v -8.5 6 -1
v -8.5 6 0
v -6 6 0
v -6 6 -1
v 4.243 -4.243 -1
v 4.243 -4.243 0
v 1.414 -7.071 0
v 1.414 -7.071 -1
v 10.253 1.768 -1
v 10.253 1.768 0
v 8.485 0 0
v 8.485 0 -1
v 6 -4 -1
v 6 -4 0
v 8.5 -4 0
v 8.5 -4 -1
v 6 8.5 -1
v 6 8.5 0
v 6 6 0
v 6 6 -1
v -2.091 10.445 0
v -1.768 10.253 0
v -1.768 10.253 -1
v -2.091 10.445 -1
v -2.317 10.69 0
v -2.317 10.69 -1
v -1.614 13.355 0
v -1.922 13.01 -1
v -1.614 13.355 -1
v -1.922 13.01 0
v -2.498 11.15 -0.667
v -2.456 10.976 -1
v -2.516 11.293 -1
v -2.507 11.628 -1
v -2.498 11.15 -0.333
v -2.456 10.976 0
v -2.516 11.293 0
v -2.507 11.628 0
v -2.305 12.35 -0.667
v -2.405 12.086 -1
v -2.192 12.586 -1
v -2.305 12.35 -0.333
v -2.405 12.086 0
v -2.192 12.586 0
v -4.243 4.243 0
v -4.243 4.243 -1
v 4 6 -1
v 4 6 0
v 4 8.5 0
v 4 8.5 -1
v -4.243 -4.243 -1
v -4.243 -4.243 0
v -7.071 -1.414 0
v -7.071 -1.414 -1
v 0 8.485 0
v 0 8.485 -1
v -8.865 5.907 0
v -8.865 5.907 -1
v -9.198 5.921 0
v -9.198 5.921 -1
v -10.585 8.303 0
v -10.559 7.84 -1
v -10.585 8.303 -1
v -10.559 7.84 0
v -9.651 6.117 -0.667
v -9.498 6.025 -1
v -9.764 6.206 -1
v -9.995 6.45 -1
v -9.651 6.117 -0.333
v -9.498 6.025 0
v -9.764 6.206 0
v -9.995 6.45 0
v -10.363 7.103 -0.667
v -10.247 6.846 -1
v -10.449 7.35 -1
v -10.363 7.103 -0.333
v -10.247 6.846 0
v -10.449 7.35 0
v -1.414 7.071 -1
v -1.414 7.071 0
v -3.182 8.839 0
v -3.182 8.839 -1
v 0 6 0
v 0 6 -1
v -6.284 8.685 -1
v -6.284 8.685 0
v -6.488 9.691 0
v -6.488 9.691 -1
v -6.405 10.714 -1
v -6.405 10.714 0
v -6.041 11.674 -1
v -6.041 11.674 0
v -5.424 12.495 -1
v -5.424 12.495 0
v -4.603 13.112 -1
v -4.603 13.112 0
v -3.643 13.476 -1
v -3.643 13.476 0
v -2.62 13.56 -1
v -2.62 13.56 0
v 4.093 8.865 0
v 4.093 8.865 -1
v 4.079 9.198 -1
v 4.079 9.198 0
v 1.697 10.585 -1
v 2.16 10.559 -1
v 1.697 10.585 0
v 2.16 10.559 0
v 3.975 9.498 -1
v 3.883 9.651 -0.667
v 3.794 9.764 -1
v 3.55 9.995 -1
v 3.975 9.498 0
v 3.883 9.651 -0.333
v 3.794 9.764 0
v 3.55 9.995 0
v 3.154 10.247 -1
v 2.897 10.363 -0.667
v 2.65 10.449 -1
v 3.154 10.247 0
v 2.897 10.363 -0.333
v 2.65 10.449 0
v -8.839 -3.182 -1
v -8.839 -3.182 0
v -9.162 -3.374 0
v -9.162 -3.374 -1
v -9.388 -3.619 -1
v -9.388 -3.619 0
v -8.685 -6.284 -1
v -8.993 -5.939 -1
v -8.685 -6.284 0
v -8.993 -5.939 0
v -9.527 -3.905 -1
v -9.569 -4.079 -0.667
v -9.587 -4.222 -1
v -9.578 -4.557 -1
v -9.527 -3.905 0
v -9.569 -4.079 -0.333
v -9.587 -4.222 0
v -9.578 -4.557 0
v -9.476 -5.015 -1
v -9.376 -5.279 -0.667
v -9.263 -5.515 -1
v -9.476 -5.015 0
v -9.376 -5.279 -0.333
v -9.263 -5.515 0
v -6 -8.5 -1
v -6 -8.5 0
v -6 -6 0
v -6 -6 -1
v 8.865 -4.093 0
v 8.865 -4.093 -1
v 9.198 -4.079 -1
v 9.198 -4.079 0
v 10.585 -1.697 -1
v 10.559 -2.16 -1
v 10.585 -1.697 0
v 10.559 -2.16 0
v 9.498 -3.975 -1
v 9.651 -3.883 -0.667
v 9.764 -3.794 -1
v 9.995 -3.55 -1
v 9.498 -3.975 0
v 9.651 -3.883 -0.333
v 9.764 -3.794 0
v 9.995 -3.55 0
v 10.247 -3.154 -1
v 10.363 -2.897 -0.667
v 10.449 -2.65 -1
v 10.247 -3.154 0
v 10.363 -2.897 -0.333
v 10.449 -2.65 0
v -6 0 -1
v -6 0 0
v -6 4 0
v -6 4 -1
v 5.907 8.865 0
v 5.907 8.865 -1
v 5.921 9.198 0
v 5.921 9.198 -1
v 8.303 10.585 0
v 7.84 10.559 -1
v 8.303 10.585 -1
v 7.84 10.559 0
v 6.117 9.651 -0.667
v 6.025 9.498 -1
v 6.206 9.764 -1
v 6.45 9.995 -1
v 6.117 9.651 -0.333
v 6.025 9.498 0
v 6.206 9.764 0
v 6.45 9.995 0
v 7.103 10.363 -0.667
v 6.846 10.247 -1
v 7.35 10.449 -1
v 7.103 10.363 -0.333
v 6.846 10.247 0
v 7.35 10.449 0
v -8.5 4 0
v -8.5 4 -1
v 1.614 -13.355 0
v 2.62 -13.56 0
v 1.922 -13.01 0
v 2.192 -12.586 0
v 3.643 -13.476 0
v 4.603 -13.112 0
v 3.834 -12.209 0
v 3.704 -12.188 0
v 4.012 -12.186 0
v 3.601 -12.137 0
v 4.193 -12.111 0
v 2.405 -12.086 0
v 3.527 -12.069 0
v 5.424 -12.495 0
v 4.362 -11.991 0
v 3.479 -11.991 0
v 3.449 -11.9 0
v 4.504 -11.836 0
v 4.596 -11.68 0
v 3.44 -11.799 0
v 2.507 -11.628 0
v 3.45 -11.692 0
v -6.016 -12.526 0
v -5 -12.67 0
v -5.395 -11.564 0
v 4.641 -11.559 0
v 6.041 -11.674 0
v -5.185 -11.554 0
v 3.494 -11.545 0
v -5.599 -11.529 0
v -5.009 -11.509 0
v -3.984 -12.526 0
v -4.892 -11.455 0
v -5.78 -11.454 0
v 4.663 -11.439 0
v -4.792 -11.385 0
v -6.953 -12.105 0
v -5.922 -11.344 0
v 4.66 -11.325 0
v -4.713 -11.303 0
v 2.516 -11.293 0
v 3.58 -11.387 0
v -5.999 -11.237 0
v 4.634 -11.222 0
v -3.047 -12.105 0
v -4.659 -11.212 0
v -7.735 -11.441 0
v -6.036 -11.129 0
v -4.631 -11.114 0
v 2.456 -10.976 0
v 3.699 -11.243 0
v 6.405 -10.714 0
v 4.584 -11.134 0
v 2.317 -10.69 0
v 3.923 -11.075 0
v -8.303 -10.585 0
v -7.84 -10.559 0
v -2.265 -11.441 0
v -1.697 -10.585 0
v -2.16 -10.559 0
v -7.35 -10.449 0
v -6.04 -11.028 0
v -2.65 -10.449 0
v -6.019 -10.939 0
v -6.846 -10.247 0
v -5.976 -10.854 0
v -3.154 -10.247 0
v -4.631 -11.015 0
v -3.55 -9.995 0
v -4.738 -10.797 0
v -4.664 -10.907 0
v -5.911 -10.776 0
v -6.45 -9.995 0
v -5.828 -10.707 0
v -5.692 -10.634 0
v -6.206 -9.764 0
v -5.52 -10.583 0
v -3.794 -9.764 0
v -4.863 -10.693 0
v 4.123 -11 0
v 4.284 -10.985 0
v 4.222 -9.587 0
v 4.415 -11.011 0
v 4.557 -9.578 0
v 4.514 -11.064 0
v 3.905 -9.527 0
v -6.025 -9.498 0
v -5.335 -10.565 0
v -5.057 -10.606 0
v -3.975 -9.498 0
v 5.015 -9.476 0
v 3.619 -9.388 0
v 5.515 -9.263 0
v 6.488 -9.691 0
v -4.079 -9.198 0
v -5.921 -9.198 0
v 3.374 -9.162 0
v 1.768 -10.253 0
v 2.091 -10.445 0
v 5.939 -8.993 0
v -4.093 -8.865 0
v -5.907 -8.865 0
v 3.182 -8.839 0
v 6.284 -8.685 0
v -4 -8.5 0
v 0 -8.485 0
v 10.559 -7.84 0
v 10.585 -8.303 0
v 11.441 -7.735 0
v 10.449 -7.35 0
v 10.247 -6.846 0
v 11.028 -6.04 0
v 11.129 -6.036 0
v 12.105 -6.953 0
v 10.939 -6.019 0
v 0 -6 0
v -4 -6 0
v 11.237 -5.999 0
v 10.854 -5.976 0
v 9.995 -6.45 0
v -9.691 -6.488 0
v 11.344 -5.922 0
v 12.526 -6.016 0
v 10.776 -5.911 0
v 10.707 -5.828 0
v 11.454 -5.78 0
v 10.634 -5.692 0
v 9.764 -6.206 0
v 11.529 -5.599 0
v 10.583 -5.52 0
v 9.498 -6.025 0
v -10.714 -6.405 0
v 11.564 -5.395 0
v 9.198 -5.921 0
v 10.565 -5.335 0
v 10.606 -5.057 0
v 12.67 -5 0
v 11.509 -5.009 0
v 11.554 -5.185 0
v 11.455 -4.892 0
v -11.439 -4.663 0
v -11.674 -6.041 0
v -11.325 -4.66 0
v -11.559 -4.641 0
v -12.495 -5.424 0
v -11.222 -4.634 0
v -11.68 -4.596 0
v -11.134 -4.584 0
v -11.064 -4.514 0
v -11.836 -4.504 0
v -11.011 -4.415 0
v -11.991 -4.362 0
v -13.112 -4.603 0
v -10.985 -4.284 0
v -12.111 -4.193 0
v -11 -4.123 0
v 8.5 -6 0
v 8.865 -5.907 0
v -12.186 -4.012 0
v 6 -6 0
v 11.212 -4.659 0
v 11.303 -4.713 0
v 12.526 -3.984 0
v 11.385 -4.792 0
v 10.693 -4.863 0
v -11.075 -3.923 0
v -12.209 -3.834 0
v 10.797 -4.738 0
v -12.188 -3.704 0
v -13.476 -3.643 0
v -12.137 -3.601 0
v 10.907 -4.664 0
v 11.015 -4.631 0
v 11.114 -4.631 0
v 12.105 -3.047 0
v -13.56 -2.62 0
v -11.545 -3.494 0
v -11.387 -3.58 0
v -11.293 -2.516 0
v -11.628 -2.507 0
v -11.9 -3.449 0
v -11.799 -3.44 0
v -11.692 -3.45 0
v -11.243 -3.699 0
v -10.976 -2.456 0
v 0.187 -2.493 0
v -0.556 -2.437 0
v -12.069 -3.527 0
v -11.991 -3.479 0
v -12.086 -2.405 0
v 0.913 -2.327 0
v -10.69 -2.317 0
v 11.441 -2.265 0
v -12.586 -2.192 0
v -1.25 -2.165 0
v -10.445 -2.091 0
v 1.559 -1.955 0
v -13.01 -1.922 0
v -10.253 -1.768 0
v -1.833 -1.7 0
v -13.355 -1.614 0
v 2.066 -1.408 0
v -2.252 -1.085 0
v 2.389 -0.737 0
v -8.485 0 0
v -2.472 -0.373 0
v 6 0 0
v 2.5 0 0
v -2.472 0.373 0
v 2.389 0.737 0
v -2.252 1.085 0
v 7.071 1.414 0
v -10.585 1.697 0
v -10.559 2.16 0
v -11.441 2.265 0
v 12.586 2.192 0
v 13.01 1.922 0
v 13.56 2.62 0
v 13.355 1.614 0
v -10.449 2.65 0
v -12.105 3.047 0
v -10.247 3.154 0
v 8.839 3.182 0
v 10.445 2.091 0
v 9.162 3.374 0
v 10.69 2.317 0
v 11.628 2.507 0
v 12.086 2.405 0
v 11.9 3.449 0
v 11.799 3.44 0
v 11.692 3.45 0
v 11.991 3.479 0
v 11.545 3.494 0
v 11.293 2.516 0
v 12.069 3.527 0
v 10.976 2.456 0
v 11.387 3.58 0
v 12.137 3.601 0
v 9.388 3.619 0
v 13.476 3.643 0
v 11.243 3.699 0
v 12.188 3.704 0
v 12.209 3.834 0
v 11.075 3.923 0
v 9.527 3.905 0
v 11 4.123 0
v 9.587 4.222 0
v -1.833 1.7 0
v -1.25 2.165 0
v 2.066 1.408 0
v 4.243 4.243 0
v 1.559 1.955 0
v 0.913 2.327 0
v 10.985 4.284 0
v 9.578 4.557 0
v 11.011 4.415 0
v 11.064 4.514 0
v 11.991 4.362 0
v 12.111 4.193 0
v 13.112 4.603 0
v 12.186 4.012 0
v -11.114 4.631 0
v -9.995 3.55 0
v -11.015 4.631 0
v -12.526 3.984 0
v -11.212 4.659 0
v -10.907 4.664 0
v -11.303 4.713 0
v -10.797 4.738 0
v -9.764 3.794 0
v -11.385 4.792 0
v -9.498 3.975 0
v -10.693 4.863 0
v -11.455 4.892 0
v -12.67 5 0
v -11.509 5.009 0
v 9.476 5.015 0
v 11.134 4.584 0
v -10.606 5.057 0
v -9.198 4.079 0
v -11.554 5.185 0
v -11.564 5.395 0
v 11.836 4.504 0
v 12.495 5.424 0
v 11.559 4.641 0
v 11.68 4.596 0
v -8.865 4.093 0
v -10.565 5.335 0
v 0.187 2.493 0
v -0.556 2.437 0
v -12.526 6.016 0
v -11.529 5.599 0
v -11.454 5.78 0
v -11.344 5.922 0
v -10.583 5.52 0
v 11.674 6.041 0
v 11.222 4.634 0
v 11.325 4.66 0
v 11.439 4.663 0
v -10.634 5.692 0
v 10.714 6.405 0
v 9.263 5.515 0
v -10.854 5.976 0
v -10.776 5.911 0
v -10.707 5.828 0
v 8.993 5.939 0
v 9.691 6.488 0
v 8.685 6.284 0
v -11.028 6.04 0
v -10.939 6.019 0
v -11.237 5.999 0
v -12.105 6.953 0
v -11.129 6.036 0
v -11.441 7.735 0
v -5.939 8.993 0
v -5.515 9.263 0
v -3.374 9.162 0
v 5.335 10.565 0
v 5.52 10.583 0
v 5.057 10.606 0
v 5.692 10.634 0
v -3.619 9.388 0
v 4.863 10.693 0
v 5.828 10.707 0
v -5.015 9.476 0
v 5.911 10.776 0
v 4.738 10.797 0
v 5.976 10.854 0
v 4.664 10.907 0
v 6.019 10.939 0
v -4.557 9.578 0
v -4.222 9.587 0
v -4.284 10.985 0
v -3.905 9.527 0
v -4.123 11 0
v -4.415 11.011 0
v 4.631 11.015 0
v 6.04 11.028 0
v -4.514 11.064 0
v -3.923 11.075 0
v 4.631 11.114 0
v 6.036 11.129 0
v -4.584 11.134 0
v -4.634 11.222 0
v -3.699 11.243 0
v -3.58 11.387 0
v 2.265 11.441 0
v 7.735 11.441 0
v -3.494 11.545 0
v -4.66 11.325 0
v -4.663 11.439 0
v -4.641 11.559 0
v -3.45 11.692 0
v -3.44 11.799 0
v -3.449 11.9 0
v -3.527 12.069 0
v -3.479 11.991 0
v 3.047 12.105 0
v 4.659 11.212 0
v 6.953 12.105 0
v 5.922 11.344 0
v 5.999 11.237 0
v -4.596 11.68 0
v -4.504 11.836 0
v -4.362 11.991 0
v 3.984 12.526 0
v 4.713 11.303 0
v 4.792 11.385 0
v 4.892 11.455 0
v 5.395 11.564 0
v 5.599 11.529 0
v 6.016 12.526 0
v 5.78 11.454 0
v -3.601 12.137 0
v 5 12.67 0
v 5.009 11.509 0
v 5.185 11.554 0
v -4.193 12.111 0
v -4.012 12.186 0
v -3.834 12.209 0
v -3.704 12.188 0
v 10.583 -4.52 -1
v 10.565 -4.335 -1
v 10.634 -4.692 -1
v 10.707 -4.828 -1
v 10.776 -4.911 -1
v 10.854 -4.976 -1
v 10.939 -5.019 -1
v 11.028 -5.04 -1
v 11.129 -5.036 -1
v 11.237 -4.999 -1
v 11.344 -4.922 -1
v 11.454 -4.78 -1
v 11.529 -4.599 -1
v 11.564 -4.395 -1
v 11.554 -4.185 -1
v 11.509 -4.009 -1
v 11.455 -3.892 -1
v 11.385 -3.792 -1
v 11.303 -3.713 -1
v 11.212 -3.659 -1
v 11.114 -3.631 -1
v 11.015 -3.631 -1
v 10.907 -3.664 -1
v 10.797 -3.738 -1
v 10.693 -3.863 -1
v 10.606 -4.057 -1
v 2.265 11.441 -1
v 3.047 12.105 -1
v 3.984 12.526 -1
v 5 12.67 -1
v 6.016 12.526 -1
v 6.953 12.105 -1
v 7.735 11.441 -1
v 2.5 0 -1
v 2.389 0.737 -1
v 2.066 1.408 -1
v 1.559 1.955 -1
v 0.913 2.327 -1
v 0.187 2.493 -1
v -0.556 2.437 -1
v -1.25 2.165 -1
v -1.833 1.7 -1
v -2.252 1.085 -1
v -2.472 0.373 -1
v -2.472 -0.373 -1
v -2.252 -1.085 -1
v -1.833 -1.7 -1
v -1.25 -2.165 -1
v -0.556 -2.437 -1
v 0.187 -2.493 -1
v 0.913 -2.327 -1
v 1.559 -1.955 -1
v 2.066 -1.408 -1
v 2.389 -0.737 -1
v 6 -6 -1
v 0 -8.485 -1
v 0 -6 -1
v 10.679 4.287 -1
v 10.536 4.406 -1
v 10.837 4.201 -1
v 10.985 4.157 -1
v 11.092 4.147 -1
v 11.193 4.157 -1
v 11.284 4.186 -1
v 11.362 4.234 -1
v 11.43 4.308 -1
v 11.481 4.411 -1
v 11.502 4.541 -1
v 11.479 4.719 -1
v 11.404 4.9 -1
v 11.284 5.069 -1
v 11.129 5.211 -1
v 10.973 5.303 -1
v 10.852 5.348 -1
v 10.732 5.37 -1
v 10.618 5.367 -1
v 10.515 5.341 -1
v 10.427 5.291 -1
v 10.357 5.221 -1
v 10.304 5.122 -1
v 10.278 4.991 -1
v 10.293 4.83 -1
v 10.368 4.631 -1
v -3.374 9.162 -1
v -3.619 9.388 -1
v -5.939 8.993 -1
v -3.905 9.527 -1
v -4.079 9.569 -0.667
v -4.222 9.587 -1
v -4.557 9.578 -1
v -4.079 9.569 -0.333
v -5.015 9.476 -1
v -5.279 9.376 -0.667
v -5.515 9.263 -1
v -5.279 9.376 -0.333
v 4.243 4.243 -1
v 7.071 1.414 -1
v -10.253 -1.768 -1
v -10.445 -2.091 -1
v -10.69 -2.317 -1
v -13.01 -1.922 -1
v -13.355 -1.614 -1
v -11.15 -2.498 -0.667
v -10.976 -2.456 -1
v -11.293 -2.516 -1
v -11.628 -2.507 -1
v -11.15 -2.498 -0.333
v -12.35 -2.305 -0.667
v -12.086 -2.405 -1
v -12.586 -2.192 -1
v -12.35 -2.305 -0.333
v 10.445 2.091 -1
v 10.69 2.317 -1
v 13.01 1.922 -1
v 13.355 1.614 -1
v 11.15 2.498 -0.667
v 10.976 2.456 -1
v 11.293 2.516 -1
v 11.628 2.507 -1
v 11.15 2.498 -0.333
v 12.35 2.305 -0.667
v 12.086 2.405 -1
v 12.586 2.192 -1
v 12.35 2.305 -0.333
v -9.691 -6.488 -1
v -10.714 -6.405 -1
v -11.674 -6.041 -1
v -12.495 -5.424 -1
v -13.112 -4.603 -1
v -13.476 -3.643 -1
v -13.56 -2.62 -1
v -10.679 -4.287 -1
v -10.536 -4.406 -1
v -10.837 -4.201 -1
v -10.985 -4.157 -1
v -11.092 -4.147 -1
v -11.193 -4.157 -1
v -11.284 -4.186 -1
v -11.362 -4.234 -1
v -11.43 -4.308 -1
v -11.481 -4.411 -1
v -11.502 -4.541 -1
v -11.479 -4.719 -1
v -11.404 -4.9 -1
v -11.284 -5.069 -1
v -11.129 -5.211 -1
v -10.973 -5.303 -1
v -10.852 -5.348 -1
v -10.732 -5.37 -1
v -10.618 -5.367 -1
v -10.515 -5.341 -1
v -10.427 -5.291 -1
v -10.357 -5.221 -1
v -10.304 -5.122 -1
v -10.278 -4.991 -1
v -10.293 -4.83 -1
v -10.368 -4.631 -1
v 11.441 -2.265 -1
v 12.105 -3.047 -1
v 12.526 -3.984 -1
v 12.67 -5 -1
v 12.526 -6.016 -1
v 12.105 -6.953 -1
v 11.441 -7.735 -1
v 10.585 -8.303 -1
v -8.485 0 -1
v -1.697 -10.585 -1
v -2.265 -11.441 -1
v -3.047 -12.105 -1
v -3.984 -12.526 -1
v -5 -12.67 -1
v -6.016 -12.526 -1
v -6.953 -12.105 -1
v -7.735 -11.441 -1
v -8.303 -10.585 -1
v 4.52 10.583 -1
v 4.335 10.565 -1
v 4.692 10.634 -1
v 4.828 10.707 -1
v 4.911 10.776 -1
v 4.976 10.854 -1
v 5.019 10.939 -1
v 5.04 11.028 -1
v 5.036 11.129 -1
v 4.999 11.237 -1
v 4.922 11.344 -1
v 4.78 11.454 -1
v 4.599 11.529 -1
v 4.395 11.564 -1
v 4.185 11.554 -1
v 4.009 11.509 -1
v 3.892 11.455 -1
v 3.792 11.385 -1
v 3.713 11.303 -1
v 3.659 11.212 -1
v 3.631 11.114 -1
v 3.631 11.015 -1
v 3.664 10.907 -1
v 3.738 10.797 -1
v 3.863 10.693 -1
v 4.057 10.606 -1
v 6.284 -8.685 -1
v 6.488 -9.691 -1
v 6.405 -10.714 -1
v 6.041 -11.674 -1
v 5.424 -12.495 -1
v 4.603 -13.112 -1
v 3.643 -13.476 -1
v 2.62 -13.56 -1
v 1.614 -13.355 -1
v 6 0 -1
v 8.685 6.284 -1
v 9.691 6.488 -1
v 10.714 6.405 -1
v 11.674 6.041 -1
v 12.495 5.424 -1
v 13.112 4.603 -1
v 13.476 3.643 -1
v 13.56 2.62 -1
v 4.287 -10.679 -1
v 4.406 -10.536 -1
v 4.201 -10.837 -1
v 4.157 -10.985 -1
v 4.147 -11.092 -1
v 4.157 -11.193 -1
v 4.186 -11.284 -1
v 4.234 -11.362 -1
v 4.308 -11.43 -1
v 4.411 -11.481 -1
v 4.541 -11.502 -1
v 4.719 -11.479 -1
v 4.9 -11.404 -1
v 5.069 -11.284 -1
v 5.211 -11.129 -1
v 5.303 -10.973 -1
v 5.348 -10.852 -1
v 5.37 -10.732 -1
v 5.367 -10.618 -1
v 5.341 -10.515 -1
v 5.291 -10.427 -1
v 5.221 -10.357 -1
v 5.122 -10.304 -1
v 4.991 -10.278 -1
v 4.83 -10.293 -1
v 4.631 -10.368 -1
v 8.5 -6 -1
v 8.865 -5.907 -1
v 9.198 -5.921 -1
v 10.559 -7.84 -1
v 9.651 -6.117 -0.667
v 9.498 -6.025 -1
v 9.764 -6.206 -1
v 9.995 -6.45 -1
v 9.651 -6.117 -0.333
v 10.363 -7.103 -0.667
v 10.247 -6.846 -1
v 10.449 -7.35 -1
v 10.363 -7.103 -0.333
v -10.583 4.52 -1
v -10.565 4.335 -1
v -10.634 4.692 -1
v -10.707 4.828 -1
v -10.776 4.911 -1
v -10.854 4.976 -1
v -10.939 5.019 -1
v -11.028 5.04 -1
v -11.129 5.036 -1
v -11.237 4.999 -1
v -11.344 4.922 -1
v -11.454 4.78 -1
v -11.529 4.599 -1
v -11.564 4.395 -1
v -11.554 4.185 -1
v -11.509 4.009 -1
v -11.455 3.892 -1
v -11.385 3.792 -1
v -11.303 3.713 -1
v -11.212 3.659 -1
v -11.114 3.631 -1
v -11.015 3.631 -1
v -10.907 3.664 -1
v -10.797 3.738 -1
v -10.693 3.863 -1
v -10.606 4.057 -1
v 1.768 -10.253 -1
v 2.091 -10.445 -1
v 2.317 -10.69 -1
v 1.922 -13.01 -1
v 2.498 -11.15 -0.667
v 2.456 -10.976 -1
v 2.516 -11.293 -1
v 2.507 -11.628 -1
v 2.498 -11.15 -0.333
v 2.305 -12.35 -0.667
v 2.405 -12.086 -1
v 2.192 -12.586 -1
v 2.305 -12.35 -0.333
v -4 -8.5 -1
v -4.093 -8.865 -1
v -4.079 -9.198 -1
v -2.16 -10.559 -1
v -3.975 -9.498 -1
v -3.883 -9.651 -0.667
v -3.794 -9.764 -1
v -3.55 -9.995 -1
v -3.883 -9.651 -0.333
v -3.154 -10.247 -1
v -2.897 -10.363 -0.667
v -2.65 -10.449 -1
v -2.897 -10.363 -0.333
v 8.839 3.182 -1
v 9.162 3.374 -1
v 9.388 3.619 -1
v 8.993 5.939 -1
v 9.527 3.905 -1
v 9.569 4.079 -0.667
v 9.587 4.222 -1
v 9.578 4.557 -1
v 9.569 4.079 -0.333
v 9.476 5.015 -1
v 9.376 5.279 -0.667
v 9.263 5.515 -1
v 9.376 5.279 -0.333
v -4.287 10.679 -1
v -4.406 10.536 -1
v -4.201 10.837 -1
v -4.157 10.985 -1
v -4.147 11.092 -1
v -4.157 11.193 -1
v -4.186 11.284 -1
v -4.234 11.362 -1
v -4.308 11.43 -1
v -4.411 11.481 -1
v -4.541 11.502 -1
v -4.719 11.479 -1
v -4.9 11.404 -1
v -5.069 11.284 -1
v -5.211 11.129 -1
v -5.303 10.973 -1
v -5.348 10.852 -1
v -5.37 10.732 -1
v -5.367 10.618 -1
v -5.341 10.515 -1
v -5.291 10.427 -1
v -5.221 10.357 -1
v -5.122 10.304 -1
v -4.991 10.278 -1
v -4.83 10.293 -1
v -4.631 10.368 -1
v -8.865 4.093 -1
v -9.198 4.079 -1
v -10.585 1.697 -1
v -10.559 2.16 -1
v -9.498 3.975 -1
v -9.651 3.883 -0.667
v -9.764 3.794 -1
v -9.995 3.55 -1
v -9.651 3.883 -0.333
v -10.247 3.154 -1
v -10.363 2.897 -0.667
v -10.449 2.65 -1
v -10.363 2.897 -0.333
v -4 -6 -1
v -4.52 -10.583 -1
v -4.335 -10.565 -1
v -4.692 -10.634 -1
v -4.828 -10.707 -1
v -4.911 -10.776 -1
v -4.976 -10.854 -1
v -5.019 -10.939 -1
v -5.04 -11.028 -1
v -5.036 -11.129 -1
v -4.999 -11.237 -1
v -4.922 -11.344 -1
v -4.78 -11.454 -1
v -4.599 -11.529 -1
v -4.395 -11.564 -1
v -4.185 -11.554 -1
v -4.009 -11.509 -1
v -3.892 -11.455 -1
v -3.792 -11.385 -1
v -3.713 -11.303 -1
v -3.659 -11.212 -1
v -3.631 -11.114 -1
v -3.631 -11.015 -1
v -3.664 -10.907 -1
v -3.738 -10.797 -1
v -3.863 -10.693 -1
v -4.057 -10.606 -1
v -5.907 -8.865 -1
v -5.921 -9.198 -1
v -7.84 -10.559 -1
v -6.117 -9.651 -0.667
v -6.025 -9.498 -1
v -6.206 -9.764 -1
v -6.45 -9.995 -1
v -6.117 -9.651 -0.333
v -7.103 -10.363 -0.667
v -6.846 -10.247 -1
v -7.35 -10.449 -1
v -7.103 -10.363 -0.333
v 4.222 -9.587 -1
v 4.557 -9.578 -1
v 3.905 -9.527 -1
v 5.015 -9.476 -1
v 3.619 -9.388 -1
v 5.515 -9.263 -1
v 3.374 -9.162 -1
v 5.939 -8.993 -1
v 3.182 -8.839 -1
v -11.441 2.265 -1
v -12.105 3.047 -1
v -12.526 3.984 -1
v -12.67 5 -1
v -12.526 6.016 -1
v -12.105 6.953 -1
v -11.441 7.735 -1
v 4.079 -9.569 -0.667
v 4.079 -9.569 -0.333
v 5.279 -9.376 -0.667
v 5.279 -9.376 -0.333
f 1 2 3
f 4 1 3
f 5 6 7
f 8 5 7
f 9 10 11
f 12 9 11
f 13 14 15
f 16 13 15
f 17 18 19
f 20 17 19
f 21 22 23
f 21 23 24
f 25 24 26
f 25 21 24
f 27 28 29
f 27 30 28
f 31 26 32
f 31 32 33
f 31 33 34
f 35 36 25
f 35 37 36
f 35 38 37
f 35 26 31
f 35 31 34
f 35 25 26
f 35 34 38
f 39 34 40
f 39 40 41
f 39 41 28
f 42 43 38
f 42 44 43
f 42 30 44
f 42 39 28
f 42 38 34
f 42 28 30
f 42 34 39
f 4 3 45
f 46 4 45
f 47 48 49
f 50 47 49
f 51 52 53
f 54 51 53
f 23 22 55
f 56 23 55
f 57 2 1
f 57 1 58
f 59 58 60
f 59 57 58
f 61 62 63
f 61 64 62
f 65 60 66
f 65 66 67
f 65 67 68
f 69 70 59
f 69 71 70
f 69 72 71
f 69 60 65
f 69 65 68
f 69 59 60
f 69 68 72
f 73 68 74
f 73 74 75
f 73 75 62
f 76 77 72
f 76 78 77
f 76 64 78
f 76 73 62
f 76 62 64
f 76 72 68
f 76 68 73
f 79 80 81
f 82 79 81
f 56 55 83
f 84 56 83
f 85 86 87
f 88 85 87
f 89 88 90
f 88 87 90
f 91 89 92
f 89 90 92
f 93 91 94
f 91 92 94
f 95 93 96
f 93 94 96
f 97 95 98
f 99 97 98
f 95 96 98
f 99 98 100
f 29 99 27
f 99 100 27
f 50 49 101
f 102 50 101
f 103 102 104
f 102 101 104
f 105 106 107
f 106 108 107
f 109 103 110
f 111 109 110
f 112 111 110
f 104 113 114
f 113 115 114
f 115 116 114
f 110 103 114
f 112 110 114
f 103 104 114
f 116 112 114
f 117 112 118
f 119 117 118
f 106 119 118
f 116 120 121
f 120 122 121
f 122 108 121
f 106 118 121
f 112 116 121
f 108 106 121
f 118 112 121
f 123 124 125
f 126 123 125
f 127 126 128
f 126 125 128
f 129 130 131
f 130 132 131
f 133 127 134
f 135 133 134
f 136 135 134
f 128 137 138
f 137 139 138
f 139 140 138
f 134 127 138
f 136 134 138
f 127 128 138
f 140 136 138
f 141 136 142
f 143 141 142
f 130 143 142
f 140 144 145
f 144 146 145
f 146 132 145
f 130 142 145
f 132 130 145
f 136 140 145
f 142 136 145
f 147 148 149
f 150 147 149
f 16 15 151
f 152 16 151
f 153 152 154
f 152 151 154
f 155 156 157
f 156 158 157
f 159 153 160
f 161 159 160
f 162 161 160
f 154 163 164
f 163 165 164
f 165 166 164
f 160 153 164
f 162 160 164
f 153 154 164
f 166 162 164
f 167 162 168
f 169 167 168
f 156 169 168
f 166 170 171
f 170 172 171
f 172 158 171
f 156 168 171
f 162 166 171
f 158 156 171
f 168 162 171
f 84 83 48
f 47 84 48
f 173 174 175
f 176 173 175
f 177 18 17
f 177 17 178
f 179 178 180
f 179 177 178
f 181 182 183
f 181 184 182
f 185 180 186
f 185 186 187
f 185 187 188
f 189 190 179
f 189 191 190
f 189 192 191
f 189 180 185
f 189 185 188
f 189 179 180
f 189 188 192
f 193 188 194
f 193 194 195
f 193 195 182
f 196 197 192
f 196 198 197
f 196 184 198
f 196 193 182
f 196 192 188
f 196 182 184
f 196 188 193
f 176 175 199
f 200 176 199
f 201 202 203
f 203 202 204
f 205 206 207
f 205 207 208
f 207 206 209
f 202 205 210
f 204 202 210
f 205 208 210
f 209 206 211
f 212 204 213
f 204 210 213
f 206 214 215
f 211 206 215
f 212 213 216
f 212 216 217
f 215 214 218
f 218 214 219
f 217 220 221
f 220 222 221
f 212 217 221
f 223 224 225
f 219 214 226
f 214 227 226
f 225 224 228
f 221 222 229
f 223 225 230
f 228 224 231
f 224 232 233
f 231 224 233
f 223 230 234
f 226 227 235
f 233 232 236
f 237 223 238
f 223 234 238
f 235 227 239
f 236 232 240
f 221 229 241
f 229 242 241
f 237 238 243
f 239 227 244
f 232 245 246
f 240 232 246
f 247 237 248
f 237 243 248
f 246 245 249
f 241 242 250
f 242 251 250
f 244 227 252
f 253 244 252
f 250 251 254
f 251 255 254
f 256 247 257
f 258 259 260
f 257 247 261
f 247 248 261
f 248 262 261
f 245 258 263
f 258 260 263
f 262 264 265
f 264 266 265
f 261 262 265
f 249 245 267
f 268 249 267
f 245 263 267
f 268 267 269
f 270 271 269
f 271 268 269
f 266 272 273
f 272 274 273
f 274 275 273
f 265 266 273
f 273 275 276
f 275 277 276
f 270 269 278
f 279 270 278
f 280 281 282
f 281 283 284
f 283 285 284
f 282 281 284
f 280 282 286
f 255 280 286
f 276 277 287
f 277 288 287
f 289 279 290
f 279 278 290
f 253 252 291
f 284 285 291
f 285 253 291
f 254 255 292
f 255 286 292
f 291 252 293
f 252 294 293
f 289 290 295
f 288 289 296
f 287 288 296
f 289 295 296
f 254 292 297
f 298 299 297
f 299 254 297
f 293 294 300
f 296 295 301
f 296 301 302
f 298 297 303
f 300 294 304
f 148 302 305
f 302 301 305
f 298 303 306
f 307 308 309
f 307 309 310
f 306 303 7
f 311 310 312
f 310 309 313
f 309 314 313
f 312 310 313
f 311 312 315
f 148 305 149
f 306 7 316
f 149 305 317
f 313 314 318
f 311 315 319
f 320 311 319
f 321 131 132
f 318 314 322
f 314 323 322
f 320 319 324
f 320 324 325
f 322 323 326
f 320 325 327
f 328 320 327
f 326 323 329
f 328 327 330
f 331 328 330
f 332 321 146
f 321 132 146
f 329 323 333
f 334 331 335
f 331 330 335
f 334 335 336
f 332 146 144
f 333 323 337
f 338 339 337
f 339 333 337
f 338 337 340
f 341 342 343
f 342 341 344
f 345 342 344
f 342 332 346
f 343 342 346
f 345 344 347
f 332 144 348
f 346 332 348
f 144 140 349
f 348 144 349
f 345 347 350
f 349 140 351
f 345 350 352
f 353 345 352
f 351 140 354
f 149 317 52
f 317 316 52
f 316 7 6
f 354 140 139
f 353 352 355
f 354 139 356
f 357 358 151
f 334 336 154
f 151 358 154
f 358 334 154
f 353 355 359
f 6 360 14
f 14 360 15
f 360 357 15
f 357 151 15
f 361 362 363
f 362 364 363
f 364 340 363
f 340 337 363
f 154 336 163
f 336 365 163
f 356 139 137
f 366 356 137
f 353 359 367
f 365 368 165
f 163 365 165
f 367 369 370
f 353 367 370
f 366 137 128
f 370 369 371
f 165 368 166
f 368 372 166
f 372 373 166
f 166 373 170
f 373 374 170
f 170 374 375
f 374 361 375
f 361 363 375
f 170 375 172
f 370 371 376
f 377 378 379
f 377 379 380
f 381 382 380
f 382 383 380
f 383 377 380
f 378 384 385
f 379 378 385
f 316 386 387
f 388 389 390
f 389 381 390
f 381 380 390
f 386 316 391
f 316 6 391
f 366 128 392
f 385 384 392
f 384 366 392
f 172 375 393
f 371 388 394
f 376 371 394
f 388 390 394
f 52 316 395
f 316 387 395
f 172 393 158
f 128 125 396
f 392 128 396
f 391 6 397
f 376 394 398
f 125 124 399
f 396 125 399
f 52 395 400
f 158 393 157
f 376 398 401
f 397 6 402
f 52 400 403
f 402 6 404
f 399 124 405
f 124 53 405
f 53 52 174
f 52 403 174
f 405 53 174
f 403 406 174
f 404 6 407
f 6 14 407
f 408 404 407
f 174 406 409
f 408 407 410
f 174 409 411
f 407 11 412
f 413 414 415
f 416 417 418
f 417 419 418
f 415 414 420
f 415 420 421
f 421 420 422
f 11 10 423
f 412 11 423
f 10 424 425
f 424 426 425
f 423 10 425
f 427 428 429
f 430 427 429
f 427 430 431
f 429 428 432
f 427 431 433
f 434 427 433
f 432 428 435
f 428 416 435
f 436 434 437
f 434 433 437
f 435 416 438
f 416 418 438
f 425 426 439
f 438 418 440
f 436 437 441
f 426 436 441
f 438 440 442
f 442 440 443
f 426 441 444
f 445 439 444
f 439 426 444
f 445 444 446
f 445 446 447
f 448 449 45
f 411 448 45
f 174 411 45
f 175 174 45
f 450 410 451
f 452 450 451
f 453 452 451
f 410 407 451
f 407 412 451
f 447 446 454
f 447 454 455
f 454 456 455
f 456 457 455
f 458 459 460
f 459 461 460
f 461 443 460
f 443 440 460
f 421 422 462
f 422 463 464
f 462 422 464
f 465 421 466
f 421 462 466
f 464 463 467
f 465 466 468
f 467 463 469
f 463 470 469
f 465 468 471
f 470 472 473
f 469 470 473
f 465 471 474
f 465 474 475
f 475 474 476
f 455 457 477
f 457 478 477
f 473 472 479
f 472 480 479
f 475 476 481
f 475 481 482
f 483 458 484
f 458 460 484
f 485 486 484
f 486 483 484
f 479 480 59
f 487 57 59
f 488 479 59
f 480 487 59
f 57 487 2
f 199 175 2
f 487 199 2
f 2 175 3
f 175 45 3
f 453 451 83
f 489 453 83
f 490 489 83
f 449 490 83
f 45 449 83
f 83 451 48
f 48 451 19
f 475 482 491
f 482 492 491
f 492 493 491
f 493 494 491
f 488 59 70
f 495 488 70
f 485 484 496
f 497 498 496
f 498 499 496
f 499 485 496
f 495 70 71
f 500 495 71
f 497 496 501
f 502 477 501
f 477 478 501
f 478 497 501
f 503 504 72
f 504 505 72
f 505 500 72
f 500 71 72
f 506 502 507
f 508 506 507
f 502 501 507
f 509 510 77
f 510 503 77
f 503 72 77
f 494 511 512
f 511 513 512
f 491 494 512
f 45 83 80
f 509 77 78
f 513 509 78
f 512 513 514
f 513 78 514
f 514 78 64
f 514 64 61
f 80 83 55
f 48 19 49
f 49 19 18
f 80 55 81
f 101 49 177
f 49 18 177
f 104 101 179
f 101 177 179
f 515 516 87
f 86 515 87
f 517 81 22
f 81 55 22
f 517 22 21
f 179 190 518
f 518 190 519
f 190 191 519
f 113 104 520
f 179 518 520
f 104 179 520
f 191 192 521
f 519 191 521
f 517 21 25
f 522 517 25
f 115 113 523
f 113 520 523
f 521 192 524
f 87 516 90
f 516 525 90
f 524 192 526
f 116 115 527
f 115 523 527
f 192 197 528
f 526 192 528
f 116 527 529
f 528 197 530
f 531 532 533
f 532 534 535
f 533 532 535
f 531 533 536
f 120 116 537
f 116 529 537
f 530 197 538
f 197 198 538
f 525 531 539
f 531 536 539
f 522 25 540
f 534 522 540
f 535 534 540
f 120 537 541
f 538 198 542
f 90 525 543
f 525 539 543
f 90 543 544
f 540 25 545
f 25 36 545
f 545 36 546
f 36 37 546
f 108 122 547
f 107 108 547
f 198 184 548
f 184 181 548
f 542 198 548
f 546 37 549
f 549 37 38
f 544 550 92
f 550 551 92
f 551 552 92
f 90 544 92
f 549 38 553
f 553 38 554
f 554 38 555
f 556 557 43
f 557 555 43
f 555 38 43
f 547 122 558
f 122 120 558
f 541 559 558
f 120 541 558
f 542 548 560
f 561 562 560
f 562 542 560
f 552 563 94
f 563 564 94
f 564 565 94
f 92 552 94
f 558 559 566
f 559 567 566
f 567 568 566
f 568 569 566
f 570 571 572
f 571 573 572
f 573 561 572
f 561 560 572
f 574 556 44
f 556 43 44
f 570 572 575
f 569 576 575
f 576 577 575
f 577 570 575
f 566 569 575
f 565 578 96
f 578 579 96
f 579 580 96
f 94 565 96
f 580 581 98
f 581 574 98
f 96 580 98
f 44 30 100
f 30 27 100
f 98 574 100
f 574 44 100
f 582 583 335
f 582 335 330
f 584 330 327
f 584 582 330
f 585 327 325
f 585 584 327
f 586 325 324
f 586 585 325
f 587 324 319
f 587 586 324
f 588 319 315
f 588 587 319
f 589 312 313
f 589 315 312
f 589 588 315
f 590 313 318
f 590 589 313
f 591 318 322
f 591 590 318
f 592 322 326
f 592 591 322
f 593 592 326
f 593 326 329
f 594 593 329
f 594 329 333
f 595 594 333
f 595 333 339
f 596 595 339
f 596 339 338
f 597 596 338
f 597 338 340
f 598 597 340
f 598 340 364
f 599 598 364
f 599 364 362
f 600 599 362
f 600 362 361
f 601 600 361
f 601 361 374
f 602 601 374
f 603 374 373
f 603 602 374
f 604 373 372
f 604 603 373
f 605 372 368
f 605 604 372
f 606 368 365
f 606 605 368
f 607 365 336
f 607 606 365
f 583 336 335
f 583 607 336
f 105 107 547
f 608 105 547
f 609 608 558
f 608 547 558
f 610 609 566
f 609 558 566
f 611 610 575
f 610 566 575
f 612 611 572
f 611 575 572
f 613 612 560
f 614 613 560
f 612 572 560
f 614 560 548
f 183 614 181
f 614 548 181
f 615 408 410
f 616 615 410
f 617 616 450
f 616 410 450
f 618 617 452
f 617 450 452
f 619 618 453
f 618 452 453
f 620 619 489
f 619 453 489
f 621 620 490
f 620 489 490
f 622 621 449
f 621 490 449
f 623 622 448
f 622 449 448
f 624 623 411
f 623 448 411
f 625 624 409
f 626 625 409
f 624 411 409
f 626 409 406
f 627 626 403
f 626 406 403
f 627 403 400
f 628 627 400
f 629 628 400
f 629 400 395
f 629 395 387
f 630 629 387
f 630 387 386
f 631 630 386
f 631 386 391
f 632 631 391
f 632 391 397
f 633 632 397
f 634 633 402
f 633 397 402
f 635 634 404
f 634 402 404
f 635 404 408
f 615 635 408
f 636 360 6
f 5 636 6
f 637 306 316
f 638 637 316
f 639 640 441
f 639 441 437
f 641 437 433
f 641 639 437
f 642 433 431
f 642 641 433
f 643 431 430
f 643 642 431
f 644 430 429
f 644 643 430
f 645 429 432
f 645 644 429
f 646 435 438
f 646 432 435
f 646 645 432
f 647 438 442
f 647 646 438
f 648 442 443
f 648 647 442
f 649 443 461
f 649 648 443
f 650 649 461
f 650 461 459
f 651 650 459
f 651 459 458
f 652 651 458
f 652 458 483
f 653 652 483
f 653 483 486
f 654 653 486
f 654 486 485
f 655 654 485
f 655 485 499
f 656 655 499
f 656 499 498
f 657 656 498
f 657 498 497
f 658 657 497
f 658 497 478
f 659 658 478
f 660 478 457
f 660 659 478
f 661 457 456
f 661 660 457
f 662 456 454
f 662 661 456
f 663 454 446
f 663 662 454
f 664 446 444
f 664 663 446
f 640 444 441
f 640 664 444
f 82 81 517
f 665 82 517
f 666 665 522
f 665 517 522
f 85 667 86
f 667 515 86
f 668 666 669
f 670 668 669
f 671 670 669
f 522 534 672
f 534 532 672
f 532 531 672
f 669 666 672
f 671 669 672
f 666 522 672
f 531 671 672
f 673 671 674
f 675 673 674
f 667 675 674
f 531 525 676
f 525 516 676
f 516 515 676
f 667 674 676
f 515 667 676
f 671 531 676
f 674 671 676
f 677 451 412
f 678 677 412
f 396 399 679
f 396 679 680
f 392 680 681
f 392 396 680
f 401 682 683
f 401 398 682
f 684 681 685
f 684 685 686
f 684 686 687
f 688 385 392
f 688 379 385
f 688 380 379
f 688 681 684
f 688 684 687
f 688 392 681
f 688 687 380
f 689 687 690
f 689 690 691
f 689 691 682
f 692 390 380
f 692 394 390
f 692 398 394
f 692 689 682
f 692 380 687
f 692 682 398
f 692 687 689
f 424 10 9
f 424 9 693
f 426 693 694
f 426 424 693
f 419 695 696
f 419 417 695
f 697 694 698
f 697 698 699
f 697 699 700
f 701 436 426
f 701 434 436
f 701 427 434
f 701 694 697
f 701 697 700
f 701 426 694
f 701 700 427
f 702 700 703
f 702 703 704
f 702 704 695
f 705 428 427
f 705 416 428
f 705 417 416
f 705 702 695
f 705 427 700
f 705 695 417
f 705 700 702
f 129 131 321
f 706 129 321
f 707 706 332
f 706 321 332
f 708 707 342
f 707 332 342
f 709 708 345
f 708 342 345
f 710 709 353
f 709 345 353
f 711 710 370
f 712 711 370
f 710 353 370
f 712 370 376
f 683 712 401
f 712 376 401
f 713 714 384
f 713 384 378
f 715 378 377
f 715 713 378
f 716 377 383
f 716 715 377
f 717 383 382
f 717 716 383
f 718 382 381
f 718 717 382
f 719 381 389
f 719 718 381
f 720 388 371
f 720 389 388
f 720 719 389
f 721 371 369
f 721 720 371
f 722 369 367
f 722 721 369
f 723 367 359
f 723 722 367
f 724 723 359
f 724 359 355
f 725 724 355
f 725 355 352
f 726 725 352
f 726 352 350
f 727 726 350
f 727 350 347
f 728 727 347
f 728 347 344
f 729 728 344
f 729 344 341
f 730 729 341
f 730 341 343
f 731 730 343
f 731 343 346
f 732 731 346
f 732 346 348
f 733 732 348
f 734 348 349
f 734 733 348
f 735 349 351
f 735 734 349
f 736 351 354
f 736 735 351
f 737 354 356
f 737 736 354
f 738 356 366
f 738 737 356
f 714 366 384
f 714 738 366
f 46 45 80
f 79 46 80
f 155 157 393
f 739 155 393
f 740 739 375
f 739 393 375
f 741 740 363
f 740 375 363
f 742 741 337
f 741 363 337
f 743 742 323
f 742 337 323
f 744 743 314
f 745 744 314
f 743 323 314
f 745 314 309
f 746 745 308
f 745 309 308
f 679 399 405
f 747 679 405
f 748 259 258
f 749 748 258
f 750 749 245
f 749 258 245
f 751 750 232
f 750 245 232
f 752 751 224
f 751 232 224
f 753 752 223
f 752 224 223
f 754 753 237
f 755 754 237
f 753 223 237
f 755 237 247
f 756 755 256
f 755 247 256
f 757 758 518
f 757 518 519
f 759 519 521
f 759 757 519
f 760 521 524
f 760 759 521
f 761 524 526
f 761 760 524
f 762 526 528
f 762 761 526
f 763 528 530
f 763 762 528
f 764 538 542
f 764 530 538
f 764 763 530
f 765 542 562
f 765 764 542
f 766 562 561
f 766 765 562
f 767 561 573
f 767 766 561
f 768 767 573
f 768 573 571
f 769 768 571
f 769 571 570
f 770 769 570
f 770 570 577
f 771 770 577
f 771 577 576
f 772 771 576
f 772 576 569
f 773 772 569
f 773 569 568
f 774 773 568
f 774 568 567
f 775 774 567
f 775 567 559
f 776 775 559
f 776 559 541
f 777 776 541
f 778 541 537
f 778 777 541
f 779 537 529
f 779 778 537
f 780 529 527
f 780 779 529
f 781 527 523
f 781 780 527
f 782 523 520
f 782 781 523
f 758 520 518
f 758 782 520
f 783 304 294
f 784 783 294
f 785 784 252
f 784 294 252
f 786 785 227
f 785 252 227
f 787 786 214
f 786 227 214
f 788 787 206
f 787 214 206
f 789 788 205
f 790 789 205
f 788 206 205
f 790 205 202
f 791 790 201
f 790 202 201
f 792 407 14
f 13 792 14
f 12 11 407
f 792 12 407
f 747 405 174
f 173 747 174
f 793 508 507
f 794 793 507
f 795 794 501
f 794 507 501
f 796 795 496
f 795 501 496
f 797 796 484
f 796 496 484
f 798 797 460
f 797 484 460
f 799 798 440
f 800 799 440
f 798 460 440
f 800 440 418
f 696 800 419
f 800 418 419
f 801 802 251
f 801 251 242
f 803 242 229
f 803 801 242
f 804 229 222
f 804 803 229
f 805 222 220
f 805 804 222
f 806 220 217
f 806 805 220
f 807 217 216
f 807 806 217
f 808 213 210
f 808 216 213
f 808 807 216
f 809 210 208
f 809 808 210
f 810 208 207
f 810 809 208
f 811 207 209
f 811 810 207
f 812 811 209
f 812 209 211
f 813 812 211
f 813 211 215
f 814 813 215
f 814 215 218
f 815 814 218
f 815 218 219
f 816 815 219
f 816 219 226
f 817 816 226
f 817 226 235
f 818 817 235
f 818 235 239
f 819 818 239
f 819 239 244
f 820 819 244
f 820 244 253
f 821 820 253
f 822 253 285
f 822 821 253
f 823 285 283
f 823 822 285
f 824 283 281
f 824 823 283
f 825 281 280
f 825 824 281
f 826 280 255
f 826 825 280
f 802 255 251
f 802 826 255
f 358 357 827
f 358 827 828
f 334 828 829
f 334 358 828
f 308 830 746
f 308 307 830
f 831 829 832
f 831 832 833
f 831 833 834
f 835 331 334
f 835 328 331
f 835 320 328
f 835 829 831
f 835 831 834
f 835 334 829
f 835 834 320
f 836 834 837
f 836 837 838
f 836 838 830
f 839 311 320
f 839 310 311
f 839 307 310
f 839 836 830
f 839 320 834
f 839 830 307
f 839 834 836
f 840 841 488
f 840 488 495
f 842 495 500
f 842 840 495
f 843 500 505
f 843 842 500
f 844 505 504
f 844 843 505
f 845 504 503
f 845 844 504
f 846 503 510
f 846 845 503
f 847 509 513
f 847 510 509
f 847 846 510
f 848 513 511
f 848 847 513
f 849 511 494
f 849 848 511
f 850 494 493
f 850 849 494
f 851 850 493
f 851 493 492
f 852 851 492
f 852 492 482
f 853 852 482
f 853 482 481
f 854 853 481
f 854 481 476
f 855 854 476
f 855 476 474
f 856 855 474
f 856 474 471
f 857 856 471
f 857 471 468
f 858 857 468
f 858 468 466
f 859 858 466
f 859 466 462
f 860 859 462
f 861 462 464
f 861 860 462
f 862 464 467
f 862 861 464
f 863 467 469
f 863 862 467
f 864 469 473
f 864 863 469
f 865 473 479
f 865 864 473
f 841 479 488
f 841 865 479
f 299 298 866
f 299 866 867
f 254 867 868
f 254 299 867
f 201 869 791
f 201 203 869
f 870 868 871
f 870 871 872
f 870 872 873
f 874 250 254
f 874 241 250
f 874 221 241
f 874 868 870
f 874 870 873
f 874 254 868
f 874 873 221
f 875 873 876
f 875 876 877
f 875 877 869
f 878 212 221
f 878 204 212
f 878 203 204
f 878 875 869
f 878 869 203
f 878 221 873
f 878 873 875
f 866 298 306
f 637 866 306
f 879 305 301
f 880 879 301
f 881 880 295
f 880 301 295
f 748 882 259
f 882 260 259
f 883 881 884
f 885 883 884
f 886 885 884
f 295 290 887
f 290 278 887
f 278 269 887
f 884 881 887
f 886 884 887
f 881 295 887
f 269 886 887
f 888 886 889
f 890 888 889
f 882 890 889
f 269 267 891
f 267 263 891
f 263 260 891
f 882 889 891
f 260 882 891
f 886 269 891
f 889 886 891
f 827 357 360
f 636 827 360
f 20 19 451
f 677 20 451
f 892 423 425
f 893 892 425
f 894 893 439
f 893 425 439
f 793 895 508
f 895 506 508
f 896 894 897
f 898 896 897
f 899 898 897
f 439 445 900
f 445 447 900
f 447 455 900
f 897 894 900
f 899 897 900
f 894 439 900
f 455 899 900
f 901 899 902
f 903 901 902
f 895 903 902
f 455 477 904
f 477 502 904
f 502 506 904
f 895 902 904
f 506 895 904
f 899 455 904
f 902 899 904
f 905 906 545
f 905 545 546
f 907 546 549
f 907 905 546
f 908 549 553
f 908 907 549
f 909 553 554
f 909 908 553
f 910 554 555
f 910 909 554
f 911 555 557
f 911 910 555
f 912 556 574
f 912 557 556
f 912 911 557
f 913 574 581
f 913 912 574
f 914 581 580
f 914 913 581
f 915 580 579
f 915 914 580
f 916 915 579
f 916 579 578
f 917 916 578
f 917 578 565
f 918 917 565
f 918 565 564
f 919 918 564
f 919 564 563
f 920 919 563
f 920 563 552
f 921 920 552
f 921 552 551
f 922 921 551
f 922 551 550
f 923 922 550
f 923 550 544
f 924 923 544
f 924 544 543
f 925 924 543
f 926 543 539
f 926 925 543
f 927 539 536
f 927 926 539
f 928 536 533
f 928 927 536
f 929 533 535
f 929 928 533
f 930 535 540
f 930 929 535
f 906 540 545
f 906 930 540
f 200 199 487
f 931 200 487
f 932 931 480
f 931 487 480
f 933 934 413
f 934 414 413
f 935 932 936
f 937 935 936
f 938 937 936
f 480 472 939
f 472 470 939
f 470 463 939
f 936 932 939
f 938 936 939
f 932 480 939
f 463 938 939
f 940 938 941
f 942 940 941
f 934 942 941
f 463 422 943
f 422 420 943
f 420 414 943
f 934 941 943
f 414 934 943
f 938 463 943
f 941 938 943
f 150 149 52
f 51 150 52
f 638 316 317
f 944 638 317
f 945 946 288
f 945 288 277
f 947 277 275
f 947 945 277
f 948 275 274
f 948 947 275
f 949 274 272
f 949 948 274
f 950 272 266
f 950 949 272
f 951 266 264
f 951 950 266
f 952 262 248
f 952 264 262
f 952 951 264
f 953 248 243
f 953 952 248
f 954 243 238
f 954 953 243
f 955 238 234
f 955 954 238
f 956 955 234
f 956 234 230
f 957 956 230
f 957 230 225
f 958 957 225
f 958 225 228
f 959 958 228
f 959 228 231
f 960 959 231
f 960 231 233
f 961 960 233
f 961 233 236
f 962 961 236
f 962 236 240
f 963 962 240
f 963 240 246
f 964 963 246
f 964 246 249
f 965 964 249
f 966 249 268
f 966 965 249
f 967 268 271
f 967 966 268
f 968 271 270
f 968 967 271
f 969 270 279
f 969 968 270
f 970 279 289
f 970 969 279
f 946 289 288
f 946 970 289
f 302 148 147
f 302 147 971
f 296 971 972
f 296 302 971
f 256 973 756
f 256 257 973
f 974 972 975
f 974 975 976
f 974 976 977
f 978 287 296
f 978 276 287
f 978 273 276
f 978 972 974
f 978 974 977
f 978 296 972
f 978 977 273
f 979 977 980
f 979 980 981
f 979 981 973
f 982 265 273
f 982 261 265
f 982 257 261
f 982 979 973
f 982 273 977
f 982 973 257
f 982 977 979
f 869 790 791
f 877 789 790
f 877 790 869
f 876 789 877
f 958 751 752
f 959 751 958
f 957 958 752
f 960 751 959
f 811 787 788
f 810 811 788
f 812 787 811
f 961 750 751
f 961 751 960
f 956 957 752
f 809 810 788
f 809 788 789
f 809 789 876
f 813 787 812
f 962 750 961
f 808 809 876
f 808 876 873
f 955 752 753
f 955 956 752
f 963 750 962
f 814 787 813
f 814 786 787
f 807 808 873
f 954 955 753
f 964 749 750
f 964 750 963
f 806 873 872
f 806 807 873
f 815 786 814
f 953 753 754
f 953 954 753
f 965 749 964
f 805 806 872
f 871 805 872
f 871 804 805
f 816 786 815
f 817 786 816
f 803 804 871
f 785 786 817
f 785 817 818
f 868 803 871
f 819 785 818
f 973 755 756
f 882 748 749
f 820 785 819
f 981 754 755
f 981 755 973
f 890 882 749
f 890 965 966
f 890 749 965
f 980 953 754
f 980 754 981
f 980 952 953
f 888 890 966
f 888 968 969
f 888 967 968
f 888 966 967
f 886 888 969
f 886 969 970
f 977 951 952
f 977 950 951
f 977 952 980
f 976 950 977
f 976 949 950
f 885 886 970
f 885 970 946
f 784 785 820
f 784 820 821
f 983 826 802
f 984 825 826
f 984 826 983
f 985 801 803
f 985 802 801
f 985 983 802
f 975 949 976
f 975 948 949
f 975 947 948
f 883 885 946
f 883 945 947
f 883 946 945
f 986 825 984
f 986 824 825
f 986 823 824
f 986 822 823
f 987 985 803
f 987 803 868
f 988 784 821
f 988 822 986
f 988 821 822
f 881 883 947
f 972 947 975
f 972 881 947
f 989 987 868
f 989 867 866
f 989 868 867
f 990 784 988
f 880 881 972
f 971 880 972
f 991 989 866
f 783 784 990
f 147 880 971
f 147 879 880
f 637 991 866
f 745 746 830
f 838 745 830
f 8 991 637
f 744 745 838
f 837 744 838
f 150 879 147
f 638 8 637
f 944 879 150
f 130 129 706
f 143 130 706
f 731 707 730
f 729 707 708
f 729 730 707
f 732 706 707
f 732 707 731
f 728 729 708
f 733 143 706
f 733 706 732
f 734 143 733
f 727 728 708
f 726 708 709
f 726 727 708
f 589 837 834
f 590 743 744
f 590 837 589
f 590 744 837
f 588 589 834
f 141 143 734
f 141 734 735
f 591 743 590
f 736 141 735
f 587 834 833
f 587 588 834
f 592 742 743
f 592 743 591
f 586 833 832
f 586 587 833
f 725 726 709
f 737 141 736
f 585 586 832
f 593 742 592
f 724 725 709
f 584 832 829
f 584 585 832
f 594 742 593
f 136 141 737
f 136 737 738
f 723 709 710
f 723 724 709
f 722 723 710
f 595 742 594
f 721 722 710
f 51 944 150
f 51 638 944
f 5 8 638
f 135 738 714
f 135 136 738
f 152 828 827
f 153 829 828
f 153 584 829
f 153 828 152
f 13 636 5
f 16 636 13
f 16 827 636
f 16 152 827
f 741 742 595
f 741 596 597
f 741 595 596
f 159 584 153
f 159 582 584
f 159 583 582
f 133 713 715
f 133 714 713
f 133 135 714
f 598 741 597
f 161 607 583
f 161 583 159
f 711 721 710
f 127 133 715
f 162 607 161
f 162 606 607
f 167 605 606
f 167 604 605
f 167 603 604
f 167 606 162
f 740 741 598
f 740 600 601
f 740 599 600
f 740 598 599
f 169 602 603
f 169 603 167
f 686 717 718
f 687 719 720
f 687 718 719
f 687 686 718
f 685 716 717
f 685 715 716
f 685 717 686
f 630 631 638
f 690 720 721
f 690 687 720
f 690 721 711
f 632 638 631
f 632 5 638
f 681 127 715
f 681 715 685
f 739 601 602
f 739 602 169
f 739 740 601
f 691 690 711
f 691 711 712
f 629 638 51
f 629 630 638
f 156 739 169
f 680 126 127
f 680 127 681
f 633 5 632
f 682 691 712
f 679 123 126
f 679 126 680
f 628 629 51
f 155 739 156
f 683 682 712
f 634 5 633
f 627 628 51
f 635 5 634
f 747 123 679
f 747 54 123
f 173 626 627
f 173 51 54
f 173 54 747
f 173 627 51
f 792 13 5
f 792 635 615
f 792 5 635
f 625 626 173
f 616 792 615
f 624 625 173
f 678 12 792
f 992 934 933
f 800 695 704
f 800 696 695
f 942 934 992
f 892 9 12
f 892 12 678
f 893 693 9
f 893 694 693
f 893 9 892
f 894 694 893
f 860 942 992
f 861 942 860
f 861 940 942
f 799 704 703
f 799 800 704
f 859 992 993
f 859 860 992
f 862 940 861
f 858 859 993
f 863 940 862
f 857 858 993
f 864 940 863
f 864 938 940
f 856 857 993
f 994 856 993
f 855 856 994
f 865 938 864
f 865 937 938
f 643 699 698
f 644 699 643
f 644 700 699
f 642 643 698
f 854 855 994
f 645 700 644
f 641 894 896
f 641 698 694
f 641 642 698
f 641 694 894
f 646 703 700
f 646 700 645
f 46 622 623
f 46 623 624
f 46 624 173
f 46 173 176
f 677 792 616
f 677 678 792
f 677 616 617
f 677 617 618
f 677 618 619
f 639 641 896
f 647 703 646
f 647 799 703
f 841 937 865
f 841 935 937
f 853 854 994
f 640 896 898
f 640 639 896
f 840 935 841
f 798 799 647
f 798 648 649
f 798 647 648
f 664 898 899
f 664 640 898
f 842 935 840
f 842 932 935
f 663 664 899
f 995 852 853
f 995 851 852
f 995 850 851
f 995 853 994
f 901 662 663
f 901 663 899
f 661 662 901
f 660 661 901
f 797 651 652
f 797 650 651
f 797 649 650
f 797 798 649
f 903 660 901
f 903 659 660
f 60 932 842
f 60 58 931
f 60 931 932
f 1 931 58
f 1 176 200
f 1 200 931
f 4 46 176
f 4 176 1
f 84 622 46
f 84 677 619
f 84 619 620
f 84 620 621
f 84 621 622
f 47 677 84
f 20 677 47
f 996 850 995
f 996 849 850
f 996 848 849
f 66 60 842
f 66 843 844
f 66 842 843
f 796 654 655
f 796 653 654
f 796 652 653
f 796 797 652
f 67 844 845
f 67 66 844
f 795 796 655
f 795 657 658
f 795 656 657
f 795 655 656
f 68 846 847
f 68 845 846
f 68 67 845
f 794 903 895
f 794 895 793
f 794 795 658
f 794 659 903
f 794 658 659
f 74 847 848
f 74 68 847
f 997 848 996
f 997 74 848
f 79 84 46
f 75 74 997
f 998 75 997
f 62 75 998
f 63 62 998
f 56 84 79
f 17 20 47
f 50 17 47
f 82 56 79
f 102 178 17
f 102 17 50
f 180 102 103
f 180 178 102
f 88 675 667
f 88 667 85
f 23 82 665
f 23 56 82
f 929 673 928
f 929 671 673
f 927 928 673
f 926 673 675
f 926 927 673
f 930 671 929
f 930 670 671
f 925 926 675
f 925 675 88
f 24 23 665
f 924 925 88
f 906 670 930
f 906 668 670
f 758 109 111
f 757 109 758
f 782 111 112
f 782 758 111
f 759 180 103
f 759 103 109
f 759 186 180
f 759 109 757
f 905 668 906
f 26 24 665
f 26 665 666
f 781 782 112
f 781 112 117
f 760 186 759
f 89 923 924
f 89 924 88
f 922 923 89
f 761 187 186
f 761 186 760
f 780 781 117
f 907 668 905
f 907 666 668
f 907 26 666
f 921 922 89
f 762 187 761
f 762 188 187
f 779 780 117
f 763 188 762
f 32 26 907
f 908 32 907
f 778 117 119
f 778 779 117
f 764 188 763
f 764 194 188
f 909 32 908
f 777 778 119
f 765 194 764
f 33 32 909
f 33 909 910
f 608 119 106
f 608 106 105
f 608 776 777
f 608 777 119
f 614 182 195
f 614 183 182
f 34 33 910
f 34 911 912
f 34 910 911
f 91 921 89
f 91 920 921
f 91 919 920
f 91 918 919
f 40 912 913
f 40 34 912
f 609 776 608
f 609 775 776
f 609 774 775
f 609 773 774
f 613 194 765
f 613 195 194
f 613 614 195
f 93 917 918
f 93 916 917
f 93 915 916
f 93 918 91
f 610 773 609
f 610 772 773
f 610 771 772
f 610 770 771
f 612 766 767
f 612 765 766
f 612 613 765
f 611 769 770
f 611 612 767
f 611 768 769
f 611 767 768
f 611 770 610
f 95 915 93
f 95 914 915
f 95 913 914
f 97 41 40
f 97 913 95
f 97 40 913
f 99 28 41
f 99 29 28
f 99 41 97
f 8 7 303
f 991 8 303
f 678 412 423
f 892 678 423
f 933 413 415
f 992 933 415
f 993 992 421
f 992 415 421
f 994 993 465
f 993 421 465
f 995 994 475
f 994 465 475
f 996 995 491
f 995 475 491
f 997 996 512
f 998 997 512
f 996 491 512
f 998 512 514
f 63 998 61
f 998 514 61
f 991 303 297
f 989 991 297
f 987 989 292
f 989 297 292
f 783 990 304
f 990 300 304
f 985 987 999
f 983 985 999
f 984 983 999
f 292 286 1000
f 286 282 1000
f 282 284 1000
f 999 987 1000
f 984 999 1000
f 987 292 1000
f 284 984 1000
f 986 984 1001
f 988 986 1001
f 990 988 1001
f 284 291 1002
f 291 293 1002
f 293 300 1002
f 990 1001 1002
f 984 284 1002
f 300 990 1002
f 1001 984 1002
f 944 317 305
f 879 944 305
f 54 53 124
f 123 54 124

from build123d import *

# Parameters (mm, degrees)
SKETCH1_R           = 2.5
BOSS_EXTRUDE1_DEPTH = 1
BOSS_EXTRUDE2_DEPTH = 1
CUT_EXTRUDE1_START  = -1
SKETCH5_R           = 0.5
CUT_EXTRUDE1_DEPTH  = 20.707970143
CIRPATTERN4_COUNT   = 8


with BuildPart() as part:
    # Sketch1 → Boss-Extrude1 (new body)
    with BuildSketch(Plane.XY):
        Polygon((-6, 0), (-6, 4.000001453), (-8.5, 4.000001453), (-8.5, 6), (-6, 6), (-4.242640687, 4.242640687), (-1.414212535, 7.071068839), (-3.181979488, 8.838835792), (-1.767766953, 10.253048327), (0, 8.485281374), (0, 6), (4.000001453, 6), (4.000001453, 8.5), (6, 8.5), (6, 6), (4.242640687, 4.242640687), (7.071068839, 1.414212535), (8.838835792, 3.181979488), (10.253048327, 1.767766953), (8.485281374, 0), (6, 0), (6, -4.000001453), (8.5, -4.000001453), (8.5, -6), (6, -6), (4.242640687, -4.242640687), (1.414212535, -7.071068839), (3.181979488, -8.838835792), (1.767766953, -10.253048327), (0, -8.485281374), (0, -6), (-4.000001453, -6), (-4.000001453, -8.5), (-6, -8.5), (-6, -6), (-4.242640687, -4.242640687), (-7.071068839, -1.414212535), (-8.838835792, -3.181979488), (-10.253048327, -1.767766953), (-8.485281374, 0), align=None)
        Circle(SKETCH1_R, mode=Mode.SUBTRACT)
    extrude(amount=-BOSS_EXTRUDE1_DEPTH)

    # Sketch2 → Boss-Extrude2 (add)
    with BuildSketch(Plane.XY):
        with BuildLine():
            Line((6, 8.5), (4.000001453, 8.5))
            add(Edge.make_bspline(
                [(4.000001453, 8.5), (4.535044761, 9.851871254), (2.785677296, 10.626331859), (1.69748686, 10.584769031)],
                knots=[0, 0, 0, 0, 1, 1, 1, 1], degree=3))
            ThreePointArc((1.69748686, 10.584769031), (5.000000726, 12.6701636), (8.302514593, 10.584769031))
            add(Edge.make_bspline(
                [(6, 8.5), (5.464956692, 9.851871254), (7.214324157, 10.626331859), (8.302514593, 10.584769031)],
                knots=[0, 0, 0, 0, 1, 1, 1, 1], degree=3))
        make_face()
    boss_extrude2 = extrude(amount=-BOSS_EXTRUDE2_DEPTH)

    # Sketch5 → Cut-Extrude1 (cut)
    with BuildSketch(Plane(origin=(-8.102008287, 0, -8.102008287), x_dir=(0, -1, 0), z_dir=(0.707106781, 0, 0.707106781)).offset(CUT_EXTRUDE1_START)):
        with Locations((-11.065369039, 3.772340366)):
            Circle(SKETCH5_R)
    cut_extrude1 = extrude(amount=CUT_EXTRUDE1_DEPTH, mode=Mode.SUBTRACT)

    # CirPattern4: Boss-Extrude2, Cut-Extrude1 ×8 about axis
    cirpattern4_axis = Axis((0, 0, 0), (0, 0, 1))
    for i in range(1, CIRPATTERN4_COUNT):
        add(boss_extrude2.rotate(cirpattern4_axis, i * 360 / CIRPATTERN4_COUNT))
        add(cut_extrude1.rotate(cirpattern4_axis, i * 360 / CIRPATTERN4_COUNT), mode=Mode.SUBTRACT)


solid = part.part
